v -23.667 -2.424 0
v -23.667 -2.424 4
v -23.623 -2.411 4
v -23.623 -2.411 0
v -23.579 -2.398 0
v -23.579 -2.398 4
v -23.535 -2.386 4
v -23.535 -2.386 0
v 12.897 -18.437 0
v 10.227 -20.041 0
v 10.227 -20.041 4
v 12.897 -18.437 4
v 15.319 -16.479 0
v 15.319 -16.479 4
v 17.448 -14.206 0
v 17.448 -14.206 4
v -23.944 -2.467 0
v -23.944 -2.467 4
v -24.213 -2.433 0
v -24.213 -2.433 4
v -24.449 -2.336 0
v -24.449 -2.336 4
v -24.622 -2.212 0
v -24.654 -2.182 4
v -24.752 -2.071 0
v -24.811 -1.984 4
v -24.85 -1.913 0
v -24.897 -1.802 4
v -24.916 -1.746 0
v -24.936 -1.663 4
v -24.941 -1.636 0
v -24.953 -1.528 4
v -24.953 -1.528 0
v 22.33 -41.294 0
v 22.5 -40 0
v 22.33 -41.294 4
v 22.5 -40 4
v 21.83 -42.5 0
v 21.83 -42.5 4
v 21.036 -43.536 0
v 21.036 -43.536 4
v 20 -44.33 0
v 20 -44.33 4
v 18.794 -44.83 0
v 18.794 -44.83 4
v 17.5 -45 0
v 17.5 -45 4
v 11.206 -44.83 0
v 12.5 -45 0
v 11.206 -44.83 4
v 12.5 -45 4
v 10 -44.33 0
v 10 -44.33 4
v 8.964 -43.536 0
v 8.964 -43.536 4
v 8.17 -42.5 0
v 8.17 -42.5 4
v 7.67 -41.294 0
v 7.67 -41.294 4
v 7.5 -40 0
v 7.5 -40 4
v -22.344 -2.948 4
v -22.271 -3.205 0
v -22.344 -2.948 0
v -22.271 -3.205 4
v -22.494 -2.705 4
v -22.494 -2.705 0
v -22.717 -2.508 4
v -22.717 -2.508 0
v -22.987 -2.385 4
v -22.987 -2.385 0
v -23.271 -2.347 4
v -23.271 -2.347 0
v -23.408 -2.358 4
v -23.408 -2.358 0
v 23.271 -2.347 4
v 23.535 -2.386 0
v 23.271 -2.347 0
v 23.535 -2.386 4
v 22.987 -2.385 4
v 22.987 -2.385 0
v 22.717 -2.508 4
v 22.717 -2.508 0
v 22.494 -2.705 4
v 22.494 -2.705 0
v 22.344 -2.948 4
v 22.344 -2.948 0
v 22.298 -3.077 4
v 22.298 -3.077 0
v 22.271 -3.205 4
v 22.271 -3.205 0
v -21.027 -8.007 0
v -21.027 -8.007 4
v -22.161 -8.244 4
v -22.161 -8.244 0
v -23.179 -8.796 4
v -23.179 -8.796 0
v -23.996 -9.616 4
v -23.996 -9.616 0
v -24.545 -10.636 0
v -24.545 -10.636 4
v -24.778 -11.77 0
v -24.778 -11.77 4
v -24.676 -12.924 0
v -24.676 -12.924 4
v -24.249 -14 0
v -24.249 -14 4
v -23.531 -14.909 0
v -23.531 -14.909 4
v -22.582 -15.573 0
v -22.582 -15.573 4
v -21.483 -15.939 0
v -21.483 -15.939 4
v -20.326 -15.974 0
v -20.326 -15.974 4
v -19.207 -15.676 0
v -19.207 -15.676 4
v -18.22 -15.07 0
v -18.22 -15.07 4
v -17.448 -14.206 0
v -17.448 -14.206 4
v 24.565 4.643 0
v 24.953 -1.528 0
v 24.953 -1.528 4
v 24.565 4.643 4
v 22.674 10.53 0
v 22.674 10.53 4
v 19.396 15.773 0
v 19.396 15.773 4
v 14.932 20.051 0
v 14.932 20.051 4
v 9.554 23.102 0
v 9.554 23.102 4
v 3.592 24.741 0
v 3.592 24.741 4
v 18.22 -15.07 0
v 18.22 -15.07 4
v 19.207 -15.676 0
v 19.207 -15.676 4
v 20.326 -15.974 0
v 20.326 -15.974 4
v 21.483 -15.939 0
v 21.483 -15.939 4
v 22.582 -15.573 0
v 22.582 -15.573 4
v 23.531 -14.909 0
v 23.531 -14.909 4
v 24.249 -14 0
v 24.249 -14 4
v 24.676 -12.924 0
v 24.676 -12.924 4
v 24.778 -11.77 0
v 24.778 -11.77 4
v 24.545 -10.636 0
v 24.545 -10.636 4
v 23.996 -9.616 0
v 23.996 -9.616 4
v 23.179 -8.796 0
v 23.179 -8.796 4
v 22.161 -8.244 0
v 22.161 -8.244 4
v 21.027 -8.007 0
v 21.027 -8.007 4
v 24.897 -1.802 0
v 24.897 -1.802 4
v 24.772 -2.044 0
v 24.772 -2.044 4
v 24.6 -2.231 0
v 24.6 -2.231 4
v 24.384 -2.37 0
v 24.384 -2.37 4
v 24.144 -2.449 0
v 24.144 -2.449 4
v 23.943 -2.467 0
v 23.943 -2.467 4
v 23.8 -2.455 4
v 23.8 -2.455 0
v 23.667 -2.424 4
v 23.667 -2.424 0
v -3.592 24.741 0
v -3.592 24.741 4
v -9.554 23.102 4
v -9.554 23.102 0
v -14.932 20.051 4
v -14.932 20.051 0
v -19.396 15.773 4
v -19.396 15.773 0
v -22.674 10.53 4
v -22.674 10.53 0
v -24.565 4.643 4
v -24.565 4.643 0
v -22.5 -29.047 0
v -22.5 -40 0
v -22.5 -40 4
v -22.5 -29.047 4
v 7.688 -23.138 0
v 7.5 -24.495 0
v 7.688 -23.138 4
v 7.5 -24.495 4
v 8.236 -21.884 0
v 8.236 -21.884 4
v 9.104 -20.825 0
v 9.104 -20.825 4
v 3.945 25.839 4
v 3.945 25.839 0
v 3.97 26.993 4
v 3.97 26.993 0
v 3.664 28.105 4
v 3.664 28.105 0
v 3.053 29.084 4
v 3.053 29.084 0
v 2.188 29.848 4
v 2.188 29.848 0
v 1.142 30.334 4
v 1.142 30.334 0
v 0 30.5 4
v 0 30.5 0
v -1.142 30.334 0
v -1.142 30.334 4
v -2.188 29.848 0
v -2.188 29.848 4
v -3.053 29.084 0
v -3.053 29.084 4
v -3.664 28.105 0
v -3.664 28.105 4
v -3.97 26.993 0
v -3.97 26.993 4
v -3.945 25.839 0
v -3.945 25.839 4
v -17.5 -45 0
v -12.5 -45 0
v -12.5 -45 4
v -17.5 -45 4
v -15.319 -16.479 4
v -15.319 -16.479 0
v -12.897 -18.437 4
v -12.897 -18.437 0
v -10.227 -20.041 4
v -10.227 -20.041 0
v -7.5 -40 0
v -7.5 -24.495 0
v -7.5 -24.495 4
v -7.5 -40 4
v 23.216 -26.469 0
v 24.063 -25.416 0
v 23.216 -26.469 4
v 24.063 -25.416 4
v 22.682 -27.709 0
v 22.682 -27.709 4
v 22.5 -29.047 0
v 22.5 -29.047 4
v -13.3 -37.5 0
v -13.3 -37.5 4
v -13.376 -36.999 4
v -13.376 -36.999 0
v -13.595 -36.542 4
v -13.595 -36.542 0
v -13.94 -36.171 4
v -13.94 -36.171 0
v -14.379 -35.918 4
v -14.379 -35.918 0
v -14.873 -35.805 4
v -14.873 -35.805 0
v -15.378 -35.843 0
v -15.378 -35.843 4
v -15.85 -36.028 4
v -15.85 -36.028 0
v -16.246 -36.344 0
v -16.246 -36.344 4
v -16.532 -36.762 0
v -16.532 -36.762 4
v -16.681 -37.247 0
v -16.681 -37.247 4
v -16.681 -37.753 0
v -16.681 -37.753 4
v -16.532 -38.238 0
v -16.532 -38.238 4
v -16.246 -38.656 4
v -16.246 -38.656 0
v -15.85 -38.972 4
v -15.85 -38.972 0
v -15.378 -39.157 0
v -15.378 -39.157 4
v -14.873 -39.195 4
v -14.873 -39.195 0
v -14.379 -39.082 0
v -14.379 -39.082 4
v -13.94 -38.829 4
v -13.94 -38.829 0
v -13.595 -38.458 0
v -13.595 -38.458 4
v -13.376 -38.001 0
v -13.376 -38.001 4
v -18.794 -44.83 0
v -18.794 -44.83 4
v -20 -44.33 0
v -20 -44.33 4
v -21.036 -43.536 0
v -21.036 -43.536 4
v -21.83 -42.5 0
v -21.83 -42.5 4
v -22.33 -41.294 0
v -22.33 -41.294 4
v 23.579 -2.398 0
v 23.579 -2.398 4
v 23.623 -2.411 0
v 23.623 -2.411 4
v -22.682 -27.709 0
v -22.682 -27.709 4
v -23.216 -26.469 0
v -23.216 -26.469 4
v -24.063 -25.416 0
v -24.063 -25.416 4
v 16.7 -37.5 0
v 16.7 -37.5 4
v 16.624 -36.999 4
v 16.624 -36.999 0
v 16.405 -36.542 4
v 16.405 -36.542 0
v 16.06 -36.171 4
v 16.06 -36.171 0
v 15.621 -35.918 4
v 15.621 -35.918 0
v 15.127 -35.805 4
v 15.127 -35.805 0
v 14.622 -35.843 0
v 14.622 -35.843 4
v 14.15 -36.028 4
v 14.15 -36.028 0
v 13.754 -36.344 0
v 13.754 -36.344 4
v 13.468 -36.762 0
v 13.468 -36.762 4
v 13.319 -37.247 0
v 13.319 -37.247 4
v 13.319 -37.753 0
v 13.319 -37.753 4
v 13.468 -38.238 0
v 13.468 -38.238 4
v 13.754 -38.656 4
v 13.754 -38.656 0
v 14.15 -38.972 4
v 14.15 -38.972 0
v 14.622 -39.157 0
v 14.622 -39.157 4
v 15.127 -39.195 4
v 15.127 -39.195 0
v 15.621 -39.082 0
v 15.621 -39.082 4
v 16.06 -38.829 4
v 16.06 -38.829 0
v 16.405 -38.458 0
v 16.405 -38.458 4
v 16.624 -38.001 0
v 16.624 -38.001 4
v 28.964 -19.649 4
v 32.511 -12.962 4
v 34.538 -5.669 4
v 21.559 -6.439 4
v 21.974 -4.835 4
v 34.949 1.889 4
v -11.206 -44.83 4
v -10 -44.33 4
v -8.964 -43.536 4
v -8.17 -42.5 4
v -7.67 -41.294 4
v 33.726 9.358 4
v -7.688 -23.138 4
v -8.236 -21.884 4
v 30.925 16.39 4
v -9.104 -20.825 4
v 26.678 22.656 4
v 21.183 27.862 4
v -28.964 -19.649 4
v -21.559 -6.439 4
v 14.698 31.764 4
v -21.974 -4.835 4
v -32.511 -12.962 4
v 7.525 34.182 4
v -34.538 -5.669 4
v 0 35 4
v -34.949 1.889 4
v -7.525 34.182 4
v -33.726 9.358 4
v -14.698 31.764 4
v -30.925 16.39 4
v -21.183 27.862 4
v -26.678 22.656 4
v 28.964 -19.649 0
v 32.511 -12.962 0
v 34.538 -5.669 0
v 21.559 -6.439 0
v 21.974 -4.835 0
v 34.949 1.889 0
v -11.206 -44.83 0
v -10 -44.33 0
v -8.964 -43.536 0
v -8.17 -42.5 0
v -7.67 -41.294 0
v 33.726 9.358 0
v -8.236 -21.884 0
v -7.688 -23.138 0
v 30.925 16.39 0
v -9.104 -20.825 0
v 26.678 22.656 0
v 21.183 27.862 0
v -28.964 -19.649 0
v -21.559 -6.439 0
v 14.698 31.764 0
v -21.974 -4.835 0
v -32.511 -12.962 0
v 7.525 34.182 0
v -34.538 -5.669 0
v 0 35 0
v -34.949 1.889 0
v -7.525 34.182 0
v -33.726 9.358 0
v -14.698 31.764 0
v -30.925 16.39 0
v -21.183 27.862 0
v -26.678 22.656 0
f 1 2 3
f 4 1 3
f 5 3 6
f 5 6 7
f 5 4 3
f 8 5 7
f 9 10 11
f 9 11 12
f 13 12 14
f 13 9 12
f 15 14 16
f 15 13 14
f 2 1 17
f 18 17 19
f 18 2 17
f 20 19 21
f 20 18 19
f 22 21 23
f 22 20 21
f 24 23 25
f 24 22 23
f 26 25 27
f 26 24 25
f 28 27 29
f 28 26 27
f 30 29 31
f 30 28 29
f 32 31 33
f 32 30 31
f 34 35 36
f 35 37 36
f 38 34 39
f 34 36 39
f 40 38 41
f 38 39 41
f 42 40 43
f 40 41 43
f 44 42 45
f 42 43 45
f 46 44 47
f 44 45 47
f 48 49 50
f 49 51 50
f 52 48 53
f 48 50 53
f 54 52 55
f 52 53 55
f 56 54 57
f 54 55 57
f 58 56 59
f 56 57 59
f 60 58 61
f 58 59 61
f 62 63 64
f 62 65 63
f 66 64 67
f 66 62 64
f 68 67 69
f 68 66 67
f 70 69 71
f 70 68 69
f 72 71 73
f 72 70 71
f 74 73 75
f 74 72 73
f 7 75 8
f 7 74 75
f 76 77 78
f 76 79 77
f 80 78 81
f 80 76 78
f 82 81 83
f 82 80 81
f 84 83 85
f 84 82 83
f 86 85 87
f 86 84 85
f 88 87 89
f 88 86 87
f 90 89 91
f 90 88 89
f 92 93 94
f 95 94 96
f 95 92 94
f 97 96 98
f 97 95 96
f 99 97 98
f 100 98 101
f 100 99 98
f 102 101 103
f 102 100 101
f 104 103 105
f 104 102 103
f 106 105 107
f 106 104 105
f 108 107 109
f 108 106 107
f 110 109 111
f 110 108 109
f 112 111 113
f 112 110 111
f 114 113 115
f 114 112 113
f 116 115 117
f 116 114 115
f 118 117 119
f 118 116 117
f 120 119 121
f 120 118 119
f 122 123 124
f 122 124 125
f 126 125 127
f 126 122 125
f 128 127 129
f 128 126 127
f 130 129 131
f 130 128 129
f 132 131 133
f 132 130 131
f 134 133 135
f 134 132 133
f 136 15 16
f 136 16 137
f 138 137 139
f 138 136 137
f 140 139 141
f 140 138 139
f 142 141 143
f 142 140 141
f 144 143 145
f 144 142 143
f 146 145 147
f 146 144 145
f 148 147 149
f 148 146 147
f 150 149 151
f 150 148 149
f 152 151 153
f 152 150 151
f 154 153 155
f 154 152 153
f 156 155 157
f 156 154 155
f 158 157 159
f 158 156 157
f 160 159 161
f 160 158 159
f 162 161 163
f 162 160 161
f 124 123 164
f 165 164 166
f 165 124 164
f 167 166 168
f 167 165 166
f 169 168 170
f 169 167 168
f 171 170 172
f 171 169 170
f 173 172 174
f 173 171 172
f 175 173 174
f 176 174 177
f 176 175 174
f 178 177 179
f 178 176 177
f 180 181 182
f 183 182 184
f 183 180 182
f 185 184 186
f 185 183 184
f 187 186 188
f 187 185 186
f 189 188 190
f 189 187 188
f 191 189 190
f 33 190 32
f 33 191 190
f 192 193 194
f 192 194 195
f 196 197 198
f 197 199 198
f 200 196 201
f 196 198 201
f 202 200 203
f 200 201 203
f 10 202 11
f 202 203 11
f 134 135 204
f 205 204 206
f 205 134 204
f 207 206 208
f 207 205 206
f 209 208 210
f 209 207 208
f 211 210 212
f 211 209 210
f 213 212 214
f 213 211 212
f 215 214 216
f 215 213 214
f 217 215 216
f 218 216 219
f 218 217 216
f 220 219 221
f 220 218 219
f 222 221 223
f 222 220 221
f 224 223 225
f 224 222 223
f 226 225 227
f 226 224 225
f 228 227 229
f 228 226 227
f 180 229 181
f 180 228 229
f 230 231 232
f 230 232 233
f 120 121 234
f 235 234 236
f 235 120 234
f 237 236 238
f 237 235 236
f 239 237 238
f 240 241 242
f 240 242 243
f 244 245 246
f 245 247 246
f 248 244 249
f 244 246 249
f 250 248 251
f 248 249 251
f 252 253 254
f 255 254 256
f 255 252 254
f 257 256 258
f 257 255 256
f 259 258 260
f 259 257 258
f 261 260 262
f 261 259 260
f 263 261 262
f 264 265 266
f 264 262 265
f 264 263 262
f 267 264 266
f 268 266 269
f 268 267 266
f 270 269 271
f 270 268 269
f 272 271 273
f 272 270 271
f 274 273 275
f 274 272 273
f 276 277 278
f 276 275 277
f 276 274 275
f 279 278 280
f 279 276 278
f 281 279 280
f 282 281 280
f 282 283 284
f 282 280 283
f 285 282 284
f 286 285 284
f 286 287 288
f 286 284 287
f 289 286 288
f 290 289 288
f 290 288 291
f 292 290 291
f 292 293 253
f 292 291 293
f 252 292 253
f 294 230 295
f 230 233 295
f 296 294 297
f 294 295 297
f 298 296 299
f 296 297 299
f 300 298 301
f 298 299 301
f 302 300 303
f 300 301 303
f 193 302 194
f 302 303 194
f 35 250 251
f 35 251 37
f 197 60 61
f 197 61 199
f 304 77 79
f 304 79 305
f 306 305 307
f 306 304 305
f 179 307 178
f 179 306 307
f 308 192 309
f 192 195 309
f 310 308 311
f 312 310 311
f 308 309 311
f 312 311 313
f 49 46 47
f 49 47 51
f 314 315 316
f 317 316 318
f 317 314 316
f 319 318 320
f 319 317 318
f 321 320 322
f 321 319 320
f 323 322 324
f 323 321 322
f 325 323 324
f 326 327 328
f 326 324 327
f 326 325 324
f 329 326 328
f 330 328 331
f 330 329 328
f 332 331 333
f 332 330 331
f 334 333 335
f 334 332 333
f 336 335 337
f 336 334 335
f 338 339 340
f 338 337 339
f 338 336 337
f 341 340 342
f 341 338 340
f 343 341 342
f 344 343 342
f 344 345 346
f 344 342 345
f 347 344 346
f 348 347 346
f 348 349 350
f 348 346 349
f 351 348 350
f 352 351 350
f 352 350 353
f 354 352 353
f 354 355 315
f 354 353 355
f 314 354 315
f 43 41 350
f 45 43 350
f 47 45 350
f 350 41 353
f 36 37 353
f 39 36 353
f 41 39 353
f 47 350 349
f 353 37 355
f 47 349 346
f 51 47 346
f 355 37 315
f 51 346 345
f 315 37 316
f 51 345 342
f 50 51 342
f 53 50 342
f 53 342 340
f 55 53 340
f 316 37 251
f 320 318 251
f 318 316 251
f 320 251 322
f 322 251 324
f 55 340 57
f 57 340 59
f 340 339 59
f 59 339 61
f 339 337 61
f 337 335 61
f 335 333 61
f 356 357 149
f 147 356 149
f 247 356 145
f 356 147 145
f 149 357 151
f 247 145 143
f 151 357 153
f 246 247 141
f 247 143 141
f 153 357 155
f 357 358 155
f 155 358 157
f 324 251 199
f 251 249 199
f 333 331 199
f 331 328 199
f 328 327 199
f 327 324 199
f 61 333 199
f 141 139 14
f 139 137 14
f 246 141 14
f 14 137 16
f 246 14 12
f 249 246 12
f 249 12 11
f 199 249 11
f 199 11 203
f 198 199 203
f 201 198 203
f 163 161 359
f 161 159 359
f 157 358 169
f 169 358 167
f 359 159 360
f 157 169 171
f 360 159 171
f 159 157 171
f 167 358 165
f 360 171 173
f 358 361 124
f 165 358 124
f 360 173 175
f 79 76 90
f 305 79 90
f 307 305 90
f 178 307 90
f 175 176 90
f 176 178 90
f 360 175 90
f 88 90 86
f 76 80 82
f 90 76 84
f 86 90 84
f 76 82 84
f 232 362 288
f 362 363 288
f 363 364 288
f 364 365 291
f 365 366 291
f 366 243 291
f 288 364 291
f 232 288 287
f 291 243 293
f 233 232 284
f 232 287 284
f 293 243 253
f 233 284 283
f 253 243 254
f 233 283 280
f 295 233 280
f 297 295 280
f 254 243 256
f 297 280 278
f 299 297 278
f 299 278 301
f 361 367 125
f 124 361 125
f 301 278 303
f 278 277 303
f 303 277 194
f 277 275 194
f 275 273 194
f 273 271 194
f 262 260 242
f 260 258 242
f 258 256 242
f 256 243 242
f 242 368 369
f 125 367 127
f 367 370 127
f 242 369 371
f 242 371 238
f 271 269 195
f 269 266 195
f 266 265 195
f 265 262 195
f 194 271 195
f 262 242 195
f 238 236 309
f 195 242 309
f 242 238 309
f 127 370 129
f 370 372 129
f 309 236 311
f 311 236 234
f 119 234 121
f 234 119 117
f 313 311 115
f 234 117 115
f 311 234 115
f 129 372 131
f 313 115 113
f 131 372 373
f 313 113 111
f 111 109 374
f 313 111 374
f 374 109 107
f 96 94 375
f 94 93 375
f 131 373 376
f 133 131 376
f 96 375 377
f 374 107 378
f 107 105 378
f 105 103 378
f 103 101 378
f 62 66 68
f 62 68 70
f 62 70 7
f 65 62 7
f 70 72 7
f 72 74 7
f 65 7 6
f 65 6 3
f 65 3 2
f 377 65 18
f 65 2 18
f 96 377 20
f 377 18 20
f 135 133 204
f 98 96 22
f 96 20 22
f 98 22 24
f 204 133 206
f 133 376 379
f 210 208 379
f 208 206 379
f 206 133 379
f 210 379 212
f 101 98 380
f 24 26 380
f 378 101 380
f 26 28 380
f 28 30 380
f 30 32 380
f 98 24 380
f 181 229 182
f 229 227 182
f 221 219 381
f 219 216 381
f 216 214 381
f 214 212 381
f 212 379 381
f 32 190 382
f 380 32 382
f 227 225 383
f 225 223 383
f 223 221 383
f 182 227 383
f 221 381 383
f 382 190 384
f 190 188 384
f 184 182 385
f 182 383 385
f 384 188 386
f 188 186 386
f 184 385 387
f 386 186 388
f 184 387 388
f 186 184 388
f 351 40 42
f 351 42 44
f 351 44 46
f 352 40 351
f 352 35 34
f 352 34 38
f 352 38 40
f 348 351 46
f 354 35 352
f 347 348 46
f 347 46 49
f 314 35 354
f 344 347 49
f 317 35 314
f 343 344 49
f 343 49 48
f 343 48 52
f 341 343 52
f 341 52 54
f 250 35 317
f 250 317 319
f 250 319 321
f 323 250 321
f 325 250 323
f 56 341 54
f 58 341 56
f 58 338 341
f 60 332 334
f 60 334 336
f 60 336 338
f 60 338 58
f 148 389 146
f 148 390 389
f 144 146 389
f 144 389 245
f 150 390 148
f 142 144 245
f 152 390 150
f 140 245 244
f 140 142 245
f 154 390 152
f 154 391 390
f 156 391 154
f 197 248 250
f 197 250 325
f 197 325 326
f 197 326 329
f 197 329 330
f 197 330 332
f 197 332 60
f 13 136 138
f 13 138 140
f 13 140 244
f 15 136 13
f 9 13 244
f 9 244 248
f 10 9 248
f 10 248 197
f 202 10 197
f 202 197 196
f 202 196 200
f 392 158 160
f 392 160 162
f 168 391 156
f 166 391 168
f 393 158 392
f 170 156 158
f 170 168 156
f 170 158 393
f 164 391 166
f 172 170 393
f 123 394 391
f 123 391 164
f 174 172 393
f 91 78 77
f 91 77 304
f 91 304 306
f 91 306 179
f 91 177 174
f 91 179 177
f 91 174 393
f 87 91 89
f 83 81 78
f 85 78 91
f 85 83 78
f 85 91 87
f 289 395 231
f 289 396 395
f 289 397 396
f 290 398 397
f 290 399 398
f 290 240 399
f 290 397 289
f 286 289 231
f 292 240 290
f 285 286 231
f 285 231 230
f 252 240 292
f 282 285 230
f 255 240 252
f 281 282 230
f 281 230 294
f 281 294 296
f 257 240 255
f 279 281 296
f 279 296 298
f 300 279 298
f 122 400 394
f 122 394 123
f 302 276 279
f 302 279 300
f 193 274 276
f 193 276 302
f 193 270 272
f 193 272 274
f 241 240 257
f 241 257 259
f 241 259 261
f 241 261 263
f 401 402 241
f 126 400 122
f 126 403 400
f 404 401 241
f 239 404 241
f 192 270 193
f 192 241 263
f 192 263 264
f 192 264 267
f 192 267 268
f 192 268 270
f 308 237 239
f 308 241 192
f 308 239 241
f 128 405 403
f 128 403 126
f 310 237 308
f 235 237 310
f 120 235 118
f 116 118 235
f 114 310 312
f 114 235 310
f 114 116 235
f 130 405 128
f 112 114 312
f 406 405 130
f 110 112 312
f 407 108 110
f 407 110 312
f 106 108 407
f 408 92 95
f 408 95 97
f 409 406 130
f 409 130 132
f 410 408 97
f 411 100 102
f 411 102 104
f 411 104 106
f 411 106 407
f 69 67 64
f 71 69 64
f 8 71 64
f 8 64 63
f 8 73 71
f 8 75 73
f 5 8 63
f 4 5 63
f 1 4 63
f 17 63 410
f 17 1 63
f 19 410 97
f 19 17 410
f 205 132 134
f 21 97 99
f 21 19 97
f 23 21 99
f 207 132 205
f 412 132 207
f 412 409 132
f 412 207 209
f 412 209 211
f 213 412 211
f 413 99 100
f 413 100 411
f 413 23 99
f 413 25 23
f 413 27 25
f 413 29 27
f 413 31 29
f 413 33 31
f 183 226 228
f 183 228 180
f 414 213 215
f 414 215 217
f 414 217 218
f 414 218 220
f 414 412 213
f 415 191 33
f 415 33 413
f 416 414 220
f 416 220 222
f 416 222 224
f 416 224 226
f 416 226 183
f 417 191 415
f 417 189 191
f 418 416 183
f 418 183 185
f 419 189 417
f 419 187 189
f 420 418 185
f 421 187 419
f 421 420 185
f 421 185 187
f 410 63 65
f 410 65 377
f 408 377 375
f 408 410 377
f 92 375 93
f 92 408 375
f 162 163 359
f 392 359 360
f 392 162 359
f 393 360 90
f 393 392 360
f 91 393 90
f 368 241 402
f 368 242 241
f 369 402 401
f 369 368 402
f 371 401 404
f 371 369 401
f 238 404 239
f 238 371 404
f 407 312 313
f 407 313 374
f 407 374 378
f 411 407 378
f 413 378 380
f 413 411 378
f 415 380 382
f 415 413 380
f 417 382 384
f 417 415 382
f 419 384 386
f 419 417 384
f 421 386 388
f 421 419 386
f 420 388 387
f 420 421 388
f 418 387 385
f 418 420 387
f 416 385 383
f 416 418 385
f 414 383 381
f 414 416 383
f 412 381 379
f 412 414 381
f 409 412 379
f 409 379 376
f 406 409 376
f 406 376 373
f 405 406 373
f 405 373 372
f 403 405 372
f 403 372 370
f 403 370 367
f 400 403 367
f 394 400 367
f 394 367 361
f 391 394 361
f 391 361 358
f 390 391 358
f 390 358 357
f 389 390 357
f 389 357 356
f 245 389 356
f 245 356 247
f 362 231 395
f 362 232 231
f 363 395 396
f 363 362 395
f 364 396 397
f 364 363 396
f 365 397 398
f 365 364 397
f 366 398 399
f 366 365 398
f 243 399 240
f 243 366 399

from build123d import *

# Parameters (mm, degrees)
BOSS_EXTRUDE1_DEPTH = 4
SKETCH2_R           = 4
CUT_EXTRUDE2_DEPTH  = 5
SKETCH5_R           = 1.7
CUT_EXTRUDE3_DEPTH  = 5
FILLET1_R           = 5
FILLET2_R           = 5
FILLET3_R           = 1


with BuildPart() as part:
    # Sketch3 → Boss-Extrude1 (new body)
    with BuildSketch(Plane.XY):
        with BuildLine():
            Line((-7.5, -21.213203436), (-7.5, -45))
            Line((-7.5, -45), (-22.5, -45))
            Line((-22.5, -45), (-22.5, -26.809513237))
            ThreePointArc((-22.5, -26.809513237), (0, 35), (22.5, -26.809513237))
            Line((22.5, -26.809513237), (22.5, -45))
            Line((22.5, -45), (7.5, -45))
            Line((7.5, -45), (7.5, -21.213203436))
            ThreePointArc((7.5, -21.213203436), (17.734611105, -13.846789121), (22.398843942, -2.131147595))
            ThreePointArc((22.398843942, -2.131147595), (23.640685275, -2.41653339), (24.836154938, -2.857517782))
            ThreePointArc((24.836154938, -2.857517782), (0, 25), (-24.836154938, -2.857517782))
            ThreePointArc((-24.836154938, -2.857517782), (-23.640685275, -2.41653339), (-22.398843942, -2.131147595))
            ThreePointArc((-22.398843942, -2.131147595), (-17.734611105, -13.846789121), (-7.5, -21.213203436))
        make_face()
    extrude(amount=BOSS_EXTRUDE1_DEPTH)

    # Sketch2 → Cut-Extrude2 (cut, through all)
    with BuildSketch(Plane.XY):
        with Locations((0, 26.5)):
            Circle(SKETCH2_R)
        with Locations((-20.784609691, -12)):
            Circle(SKETCH2_R)
        with Locations((20.784609691, -12)):
            Circle(SKETCH2_R)
    extrude(amount=CUT_EXTRUDE2_DEPTH, mode=Mode.SUBTRACT)

    # Sketch5 → Cut-Extrude3 (cut, through all)
    with BuildSketch(Plane.XY):
        with Locations((-15, -37.5)):
            Circle(SKETCH5_R)
        with Locations((15, -37.5)):
            Circle(SKETCH5_R)
    extrude(amount=CUT_EXTRUDE3_DEPTH, mode=Mode.SUBTRACT)

    # Fillet1
    fillet1_edges = [part.edges().sort_by_distance(p)[0] for p in [
        (22.5, -45, 2),
        (-22.5, -45, 2),
    ]]
    fillet(fillet1_edges, radius=FILLET1_R)

    # Fillet2
    fillet2_edges = [part.edges().sort_by_distance(p)[0] for p in [
        (22.5, -26.809513237, 2),
        (7.5, -45, 2),
        (7.5, -21.213203436, 2),
        (-7.5, -21.213203436, 2),
        (-7.5, -45, 2),
        (-22.5, -26.809513237, 2),
    ]]
    fillet(fillet2_edges, radius=FILLET2_R)

    # Fillet3
    fillet3_edges = [part.edges().sort_by_distance(p)[0] for p in [
        (22.398843942, -2.131147595, 2),
        (24.836154938, -2.857517782, 2),
        (-24.836154938, -2.857517782, 2),
        (-22.398843942, -2.131147595, 2),
    ]]
    fillet(fillet3_edges, radius=FILLET3_R)


solid = part.part
